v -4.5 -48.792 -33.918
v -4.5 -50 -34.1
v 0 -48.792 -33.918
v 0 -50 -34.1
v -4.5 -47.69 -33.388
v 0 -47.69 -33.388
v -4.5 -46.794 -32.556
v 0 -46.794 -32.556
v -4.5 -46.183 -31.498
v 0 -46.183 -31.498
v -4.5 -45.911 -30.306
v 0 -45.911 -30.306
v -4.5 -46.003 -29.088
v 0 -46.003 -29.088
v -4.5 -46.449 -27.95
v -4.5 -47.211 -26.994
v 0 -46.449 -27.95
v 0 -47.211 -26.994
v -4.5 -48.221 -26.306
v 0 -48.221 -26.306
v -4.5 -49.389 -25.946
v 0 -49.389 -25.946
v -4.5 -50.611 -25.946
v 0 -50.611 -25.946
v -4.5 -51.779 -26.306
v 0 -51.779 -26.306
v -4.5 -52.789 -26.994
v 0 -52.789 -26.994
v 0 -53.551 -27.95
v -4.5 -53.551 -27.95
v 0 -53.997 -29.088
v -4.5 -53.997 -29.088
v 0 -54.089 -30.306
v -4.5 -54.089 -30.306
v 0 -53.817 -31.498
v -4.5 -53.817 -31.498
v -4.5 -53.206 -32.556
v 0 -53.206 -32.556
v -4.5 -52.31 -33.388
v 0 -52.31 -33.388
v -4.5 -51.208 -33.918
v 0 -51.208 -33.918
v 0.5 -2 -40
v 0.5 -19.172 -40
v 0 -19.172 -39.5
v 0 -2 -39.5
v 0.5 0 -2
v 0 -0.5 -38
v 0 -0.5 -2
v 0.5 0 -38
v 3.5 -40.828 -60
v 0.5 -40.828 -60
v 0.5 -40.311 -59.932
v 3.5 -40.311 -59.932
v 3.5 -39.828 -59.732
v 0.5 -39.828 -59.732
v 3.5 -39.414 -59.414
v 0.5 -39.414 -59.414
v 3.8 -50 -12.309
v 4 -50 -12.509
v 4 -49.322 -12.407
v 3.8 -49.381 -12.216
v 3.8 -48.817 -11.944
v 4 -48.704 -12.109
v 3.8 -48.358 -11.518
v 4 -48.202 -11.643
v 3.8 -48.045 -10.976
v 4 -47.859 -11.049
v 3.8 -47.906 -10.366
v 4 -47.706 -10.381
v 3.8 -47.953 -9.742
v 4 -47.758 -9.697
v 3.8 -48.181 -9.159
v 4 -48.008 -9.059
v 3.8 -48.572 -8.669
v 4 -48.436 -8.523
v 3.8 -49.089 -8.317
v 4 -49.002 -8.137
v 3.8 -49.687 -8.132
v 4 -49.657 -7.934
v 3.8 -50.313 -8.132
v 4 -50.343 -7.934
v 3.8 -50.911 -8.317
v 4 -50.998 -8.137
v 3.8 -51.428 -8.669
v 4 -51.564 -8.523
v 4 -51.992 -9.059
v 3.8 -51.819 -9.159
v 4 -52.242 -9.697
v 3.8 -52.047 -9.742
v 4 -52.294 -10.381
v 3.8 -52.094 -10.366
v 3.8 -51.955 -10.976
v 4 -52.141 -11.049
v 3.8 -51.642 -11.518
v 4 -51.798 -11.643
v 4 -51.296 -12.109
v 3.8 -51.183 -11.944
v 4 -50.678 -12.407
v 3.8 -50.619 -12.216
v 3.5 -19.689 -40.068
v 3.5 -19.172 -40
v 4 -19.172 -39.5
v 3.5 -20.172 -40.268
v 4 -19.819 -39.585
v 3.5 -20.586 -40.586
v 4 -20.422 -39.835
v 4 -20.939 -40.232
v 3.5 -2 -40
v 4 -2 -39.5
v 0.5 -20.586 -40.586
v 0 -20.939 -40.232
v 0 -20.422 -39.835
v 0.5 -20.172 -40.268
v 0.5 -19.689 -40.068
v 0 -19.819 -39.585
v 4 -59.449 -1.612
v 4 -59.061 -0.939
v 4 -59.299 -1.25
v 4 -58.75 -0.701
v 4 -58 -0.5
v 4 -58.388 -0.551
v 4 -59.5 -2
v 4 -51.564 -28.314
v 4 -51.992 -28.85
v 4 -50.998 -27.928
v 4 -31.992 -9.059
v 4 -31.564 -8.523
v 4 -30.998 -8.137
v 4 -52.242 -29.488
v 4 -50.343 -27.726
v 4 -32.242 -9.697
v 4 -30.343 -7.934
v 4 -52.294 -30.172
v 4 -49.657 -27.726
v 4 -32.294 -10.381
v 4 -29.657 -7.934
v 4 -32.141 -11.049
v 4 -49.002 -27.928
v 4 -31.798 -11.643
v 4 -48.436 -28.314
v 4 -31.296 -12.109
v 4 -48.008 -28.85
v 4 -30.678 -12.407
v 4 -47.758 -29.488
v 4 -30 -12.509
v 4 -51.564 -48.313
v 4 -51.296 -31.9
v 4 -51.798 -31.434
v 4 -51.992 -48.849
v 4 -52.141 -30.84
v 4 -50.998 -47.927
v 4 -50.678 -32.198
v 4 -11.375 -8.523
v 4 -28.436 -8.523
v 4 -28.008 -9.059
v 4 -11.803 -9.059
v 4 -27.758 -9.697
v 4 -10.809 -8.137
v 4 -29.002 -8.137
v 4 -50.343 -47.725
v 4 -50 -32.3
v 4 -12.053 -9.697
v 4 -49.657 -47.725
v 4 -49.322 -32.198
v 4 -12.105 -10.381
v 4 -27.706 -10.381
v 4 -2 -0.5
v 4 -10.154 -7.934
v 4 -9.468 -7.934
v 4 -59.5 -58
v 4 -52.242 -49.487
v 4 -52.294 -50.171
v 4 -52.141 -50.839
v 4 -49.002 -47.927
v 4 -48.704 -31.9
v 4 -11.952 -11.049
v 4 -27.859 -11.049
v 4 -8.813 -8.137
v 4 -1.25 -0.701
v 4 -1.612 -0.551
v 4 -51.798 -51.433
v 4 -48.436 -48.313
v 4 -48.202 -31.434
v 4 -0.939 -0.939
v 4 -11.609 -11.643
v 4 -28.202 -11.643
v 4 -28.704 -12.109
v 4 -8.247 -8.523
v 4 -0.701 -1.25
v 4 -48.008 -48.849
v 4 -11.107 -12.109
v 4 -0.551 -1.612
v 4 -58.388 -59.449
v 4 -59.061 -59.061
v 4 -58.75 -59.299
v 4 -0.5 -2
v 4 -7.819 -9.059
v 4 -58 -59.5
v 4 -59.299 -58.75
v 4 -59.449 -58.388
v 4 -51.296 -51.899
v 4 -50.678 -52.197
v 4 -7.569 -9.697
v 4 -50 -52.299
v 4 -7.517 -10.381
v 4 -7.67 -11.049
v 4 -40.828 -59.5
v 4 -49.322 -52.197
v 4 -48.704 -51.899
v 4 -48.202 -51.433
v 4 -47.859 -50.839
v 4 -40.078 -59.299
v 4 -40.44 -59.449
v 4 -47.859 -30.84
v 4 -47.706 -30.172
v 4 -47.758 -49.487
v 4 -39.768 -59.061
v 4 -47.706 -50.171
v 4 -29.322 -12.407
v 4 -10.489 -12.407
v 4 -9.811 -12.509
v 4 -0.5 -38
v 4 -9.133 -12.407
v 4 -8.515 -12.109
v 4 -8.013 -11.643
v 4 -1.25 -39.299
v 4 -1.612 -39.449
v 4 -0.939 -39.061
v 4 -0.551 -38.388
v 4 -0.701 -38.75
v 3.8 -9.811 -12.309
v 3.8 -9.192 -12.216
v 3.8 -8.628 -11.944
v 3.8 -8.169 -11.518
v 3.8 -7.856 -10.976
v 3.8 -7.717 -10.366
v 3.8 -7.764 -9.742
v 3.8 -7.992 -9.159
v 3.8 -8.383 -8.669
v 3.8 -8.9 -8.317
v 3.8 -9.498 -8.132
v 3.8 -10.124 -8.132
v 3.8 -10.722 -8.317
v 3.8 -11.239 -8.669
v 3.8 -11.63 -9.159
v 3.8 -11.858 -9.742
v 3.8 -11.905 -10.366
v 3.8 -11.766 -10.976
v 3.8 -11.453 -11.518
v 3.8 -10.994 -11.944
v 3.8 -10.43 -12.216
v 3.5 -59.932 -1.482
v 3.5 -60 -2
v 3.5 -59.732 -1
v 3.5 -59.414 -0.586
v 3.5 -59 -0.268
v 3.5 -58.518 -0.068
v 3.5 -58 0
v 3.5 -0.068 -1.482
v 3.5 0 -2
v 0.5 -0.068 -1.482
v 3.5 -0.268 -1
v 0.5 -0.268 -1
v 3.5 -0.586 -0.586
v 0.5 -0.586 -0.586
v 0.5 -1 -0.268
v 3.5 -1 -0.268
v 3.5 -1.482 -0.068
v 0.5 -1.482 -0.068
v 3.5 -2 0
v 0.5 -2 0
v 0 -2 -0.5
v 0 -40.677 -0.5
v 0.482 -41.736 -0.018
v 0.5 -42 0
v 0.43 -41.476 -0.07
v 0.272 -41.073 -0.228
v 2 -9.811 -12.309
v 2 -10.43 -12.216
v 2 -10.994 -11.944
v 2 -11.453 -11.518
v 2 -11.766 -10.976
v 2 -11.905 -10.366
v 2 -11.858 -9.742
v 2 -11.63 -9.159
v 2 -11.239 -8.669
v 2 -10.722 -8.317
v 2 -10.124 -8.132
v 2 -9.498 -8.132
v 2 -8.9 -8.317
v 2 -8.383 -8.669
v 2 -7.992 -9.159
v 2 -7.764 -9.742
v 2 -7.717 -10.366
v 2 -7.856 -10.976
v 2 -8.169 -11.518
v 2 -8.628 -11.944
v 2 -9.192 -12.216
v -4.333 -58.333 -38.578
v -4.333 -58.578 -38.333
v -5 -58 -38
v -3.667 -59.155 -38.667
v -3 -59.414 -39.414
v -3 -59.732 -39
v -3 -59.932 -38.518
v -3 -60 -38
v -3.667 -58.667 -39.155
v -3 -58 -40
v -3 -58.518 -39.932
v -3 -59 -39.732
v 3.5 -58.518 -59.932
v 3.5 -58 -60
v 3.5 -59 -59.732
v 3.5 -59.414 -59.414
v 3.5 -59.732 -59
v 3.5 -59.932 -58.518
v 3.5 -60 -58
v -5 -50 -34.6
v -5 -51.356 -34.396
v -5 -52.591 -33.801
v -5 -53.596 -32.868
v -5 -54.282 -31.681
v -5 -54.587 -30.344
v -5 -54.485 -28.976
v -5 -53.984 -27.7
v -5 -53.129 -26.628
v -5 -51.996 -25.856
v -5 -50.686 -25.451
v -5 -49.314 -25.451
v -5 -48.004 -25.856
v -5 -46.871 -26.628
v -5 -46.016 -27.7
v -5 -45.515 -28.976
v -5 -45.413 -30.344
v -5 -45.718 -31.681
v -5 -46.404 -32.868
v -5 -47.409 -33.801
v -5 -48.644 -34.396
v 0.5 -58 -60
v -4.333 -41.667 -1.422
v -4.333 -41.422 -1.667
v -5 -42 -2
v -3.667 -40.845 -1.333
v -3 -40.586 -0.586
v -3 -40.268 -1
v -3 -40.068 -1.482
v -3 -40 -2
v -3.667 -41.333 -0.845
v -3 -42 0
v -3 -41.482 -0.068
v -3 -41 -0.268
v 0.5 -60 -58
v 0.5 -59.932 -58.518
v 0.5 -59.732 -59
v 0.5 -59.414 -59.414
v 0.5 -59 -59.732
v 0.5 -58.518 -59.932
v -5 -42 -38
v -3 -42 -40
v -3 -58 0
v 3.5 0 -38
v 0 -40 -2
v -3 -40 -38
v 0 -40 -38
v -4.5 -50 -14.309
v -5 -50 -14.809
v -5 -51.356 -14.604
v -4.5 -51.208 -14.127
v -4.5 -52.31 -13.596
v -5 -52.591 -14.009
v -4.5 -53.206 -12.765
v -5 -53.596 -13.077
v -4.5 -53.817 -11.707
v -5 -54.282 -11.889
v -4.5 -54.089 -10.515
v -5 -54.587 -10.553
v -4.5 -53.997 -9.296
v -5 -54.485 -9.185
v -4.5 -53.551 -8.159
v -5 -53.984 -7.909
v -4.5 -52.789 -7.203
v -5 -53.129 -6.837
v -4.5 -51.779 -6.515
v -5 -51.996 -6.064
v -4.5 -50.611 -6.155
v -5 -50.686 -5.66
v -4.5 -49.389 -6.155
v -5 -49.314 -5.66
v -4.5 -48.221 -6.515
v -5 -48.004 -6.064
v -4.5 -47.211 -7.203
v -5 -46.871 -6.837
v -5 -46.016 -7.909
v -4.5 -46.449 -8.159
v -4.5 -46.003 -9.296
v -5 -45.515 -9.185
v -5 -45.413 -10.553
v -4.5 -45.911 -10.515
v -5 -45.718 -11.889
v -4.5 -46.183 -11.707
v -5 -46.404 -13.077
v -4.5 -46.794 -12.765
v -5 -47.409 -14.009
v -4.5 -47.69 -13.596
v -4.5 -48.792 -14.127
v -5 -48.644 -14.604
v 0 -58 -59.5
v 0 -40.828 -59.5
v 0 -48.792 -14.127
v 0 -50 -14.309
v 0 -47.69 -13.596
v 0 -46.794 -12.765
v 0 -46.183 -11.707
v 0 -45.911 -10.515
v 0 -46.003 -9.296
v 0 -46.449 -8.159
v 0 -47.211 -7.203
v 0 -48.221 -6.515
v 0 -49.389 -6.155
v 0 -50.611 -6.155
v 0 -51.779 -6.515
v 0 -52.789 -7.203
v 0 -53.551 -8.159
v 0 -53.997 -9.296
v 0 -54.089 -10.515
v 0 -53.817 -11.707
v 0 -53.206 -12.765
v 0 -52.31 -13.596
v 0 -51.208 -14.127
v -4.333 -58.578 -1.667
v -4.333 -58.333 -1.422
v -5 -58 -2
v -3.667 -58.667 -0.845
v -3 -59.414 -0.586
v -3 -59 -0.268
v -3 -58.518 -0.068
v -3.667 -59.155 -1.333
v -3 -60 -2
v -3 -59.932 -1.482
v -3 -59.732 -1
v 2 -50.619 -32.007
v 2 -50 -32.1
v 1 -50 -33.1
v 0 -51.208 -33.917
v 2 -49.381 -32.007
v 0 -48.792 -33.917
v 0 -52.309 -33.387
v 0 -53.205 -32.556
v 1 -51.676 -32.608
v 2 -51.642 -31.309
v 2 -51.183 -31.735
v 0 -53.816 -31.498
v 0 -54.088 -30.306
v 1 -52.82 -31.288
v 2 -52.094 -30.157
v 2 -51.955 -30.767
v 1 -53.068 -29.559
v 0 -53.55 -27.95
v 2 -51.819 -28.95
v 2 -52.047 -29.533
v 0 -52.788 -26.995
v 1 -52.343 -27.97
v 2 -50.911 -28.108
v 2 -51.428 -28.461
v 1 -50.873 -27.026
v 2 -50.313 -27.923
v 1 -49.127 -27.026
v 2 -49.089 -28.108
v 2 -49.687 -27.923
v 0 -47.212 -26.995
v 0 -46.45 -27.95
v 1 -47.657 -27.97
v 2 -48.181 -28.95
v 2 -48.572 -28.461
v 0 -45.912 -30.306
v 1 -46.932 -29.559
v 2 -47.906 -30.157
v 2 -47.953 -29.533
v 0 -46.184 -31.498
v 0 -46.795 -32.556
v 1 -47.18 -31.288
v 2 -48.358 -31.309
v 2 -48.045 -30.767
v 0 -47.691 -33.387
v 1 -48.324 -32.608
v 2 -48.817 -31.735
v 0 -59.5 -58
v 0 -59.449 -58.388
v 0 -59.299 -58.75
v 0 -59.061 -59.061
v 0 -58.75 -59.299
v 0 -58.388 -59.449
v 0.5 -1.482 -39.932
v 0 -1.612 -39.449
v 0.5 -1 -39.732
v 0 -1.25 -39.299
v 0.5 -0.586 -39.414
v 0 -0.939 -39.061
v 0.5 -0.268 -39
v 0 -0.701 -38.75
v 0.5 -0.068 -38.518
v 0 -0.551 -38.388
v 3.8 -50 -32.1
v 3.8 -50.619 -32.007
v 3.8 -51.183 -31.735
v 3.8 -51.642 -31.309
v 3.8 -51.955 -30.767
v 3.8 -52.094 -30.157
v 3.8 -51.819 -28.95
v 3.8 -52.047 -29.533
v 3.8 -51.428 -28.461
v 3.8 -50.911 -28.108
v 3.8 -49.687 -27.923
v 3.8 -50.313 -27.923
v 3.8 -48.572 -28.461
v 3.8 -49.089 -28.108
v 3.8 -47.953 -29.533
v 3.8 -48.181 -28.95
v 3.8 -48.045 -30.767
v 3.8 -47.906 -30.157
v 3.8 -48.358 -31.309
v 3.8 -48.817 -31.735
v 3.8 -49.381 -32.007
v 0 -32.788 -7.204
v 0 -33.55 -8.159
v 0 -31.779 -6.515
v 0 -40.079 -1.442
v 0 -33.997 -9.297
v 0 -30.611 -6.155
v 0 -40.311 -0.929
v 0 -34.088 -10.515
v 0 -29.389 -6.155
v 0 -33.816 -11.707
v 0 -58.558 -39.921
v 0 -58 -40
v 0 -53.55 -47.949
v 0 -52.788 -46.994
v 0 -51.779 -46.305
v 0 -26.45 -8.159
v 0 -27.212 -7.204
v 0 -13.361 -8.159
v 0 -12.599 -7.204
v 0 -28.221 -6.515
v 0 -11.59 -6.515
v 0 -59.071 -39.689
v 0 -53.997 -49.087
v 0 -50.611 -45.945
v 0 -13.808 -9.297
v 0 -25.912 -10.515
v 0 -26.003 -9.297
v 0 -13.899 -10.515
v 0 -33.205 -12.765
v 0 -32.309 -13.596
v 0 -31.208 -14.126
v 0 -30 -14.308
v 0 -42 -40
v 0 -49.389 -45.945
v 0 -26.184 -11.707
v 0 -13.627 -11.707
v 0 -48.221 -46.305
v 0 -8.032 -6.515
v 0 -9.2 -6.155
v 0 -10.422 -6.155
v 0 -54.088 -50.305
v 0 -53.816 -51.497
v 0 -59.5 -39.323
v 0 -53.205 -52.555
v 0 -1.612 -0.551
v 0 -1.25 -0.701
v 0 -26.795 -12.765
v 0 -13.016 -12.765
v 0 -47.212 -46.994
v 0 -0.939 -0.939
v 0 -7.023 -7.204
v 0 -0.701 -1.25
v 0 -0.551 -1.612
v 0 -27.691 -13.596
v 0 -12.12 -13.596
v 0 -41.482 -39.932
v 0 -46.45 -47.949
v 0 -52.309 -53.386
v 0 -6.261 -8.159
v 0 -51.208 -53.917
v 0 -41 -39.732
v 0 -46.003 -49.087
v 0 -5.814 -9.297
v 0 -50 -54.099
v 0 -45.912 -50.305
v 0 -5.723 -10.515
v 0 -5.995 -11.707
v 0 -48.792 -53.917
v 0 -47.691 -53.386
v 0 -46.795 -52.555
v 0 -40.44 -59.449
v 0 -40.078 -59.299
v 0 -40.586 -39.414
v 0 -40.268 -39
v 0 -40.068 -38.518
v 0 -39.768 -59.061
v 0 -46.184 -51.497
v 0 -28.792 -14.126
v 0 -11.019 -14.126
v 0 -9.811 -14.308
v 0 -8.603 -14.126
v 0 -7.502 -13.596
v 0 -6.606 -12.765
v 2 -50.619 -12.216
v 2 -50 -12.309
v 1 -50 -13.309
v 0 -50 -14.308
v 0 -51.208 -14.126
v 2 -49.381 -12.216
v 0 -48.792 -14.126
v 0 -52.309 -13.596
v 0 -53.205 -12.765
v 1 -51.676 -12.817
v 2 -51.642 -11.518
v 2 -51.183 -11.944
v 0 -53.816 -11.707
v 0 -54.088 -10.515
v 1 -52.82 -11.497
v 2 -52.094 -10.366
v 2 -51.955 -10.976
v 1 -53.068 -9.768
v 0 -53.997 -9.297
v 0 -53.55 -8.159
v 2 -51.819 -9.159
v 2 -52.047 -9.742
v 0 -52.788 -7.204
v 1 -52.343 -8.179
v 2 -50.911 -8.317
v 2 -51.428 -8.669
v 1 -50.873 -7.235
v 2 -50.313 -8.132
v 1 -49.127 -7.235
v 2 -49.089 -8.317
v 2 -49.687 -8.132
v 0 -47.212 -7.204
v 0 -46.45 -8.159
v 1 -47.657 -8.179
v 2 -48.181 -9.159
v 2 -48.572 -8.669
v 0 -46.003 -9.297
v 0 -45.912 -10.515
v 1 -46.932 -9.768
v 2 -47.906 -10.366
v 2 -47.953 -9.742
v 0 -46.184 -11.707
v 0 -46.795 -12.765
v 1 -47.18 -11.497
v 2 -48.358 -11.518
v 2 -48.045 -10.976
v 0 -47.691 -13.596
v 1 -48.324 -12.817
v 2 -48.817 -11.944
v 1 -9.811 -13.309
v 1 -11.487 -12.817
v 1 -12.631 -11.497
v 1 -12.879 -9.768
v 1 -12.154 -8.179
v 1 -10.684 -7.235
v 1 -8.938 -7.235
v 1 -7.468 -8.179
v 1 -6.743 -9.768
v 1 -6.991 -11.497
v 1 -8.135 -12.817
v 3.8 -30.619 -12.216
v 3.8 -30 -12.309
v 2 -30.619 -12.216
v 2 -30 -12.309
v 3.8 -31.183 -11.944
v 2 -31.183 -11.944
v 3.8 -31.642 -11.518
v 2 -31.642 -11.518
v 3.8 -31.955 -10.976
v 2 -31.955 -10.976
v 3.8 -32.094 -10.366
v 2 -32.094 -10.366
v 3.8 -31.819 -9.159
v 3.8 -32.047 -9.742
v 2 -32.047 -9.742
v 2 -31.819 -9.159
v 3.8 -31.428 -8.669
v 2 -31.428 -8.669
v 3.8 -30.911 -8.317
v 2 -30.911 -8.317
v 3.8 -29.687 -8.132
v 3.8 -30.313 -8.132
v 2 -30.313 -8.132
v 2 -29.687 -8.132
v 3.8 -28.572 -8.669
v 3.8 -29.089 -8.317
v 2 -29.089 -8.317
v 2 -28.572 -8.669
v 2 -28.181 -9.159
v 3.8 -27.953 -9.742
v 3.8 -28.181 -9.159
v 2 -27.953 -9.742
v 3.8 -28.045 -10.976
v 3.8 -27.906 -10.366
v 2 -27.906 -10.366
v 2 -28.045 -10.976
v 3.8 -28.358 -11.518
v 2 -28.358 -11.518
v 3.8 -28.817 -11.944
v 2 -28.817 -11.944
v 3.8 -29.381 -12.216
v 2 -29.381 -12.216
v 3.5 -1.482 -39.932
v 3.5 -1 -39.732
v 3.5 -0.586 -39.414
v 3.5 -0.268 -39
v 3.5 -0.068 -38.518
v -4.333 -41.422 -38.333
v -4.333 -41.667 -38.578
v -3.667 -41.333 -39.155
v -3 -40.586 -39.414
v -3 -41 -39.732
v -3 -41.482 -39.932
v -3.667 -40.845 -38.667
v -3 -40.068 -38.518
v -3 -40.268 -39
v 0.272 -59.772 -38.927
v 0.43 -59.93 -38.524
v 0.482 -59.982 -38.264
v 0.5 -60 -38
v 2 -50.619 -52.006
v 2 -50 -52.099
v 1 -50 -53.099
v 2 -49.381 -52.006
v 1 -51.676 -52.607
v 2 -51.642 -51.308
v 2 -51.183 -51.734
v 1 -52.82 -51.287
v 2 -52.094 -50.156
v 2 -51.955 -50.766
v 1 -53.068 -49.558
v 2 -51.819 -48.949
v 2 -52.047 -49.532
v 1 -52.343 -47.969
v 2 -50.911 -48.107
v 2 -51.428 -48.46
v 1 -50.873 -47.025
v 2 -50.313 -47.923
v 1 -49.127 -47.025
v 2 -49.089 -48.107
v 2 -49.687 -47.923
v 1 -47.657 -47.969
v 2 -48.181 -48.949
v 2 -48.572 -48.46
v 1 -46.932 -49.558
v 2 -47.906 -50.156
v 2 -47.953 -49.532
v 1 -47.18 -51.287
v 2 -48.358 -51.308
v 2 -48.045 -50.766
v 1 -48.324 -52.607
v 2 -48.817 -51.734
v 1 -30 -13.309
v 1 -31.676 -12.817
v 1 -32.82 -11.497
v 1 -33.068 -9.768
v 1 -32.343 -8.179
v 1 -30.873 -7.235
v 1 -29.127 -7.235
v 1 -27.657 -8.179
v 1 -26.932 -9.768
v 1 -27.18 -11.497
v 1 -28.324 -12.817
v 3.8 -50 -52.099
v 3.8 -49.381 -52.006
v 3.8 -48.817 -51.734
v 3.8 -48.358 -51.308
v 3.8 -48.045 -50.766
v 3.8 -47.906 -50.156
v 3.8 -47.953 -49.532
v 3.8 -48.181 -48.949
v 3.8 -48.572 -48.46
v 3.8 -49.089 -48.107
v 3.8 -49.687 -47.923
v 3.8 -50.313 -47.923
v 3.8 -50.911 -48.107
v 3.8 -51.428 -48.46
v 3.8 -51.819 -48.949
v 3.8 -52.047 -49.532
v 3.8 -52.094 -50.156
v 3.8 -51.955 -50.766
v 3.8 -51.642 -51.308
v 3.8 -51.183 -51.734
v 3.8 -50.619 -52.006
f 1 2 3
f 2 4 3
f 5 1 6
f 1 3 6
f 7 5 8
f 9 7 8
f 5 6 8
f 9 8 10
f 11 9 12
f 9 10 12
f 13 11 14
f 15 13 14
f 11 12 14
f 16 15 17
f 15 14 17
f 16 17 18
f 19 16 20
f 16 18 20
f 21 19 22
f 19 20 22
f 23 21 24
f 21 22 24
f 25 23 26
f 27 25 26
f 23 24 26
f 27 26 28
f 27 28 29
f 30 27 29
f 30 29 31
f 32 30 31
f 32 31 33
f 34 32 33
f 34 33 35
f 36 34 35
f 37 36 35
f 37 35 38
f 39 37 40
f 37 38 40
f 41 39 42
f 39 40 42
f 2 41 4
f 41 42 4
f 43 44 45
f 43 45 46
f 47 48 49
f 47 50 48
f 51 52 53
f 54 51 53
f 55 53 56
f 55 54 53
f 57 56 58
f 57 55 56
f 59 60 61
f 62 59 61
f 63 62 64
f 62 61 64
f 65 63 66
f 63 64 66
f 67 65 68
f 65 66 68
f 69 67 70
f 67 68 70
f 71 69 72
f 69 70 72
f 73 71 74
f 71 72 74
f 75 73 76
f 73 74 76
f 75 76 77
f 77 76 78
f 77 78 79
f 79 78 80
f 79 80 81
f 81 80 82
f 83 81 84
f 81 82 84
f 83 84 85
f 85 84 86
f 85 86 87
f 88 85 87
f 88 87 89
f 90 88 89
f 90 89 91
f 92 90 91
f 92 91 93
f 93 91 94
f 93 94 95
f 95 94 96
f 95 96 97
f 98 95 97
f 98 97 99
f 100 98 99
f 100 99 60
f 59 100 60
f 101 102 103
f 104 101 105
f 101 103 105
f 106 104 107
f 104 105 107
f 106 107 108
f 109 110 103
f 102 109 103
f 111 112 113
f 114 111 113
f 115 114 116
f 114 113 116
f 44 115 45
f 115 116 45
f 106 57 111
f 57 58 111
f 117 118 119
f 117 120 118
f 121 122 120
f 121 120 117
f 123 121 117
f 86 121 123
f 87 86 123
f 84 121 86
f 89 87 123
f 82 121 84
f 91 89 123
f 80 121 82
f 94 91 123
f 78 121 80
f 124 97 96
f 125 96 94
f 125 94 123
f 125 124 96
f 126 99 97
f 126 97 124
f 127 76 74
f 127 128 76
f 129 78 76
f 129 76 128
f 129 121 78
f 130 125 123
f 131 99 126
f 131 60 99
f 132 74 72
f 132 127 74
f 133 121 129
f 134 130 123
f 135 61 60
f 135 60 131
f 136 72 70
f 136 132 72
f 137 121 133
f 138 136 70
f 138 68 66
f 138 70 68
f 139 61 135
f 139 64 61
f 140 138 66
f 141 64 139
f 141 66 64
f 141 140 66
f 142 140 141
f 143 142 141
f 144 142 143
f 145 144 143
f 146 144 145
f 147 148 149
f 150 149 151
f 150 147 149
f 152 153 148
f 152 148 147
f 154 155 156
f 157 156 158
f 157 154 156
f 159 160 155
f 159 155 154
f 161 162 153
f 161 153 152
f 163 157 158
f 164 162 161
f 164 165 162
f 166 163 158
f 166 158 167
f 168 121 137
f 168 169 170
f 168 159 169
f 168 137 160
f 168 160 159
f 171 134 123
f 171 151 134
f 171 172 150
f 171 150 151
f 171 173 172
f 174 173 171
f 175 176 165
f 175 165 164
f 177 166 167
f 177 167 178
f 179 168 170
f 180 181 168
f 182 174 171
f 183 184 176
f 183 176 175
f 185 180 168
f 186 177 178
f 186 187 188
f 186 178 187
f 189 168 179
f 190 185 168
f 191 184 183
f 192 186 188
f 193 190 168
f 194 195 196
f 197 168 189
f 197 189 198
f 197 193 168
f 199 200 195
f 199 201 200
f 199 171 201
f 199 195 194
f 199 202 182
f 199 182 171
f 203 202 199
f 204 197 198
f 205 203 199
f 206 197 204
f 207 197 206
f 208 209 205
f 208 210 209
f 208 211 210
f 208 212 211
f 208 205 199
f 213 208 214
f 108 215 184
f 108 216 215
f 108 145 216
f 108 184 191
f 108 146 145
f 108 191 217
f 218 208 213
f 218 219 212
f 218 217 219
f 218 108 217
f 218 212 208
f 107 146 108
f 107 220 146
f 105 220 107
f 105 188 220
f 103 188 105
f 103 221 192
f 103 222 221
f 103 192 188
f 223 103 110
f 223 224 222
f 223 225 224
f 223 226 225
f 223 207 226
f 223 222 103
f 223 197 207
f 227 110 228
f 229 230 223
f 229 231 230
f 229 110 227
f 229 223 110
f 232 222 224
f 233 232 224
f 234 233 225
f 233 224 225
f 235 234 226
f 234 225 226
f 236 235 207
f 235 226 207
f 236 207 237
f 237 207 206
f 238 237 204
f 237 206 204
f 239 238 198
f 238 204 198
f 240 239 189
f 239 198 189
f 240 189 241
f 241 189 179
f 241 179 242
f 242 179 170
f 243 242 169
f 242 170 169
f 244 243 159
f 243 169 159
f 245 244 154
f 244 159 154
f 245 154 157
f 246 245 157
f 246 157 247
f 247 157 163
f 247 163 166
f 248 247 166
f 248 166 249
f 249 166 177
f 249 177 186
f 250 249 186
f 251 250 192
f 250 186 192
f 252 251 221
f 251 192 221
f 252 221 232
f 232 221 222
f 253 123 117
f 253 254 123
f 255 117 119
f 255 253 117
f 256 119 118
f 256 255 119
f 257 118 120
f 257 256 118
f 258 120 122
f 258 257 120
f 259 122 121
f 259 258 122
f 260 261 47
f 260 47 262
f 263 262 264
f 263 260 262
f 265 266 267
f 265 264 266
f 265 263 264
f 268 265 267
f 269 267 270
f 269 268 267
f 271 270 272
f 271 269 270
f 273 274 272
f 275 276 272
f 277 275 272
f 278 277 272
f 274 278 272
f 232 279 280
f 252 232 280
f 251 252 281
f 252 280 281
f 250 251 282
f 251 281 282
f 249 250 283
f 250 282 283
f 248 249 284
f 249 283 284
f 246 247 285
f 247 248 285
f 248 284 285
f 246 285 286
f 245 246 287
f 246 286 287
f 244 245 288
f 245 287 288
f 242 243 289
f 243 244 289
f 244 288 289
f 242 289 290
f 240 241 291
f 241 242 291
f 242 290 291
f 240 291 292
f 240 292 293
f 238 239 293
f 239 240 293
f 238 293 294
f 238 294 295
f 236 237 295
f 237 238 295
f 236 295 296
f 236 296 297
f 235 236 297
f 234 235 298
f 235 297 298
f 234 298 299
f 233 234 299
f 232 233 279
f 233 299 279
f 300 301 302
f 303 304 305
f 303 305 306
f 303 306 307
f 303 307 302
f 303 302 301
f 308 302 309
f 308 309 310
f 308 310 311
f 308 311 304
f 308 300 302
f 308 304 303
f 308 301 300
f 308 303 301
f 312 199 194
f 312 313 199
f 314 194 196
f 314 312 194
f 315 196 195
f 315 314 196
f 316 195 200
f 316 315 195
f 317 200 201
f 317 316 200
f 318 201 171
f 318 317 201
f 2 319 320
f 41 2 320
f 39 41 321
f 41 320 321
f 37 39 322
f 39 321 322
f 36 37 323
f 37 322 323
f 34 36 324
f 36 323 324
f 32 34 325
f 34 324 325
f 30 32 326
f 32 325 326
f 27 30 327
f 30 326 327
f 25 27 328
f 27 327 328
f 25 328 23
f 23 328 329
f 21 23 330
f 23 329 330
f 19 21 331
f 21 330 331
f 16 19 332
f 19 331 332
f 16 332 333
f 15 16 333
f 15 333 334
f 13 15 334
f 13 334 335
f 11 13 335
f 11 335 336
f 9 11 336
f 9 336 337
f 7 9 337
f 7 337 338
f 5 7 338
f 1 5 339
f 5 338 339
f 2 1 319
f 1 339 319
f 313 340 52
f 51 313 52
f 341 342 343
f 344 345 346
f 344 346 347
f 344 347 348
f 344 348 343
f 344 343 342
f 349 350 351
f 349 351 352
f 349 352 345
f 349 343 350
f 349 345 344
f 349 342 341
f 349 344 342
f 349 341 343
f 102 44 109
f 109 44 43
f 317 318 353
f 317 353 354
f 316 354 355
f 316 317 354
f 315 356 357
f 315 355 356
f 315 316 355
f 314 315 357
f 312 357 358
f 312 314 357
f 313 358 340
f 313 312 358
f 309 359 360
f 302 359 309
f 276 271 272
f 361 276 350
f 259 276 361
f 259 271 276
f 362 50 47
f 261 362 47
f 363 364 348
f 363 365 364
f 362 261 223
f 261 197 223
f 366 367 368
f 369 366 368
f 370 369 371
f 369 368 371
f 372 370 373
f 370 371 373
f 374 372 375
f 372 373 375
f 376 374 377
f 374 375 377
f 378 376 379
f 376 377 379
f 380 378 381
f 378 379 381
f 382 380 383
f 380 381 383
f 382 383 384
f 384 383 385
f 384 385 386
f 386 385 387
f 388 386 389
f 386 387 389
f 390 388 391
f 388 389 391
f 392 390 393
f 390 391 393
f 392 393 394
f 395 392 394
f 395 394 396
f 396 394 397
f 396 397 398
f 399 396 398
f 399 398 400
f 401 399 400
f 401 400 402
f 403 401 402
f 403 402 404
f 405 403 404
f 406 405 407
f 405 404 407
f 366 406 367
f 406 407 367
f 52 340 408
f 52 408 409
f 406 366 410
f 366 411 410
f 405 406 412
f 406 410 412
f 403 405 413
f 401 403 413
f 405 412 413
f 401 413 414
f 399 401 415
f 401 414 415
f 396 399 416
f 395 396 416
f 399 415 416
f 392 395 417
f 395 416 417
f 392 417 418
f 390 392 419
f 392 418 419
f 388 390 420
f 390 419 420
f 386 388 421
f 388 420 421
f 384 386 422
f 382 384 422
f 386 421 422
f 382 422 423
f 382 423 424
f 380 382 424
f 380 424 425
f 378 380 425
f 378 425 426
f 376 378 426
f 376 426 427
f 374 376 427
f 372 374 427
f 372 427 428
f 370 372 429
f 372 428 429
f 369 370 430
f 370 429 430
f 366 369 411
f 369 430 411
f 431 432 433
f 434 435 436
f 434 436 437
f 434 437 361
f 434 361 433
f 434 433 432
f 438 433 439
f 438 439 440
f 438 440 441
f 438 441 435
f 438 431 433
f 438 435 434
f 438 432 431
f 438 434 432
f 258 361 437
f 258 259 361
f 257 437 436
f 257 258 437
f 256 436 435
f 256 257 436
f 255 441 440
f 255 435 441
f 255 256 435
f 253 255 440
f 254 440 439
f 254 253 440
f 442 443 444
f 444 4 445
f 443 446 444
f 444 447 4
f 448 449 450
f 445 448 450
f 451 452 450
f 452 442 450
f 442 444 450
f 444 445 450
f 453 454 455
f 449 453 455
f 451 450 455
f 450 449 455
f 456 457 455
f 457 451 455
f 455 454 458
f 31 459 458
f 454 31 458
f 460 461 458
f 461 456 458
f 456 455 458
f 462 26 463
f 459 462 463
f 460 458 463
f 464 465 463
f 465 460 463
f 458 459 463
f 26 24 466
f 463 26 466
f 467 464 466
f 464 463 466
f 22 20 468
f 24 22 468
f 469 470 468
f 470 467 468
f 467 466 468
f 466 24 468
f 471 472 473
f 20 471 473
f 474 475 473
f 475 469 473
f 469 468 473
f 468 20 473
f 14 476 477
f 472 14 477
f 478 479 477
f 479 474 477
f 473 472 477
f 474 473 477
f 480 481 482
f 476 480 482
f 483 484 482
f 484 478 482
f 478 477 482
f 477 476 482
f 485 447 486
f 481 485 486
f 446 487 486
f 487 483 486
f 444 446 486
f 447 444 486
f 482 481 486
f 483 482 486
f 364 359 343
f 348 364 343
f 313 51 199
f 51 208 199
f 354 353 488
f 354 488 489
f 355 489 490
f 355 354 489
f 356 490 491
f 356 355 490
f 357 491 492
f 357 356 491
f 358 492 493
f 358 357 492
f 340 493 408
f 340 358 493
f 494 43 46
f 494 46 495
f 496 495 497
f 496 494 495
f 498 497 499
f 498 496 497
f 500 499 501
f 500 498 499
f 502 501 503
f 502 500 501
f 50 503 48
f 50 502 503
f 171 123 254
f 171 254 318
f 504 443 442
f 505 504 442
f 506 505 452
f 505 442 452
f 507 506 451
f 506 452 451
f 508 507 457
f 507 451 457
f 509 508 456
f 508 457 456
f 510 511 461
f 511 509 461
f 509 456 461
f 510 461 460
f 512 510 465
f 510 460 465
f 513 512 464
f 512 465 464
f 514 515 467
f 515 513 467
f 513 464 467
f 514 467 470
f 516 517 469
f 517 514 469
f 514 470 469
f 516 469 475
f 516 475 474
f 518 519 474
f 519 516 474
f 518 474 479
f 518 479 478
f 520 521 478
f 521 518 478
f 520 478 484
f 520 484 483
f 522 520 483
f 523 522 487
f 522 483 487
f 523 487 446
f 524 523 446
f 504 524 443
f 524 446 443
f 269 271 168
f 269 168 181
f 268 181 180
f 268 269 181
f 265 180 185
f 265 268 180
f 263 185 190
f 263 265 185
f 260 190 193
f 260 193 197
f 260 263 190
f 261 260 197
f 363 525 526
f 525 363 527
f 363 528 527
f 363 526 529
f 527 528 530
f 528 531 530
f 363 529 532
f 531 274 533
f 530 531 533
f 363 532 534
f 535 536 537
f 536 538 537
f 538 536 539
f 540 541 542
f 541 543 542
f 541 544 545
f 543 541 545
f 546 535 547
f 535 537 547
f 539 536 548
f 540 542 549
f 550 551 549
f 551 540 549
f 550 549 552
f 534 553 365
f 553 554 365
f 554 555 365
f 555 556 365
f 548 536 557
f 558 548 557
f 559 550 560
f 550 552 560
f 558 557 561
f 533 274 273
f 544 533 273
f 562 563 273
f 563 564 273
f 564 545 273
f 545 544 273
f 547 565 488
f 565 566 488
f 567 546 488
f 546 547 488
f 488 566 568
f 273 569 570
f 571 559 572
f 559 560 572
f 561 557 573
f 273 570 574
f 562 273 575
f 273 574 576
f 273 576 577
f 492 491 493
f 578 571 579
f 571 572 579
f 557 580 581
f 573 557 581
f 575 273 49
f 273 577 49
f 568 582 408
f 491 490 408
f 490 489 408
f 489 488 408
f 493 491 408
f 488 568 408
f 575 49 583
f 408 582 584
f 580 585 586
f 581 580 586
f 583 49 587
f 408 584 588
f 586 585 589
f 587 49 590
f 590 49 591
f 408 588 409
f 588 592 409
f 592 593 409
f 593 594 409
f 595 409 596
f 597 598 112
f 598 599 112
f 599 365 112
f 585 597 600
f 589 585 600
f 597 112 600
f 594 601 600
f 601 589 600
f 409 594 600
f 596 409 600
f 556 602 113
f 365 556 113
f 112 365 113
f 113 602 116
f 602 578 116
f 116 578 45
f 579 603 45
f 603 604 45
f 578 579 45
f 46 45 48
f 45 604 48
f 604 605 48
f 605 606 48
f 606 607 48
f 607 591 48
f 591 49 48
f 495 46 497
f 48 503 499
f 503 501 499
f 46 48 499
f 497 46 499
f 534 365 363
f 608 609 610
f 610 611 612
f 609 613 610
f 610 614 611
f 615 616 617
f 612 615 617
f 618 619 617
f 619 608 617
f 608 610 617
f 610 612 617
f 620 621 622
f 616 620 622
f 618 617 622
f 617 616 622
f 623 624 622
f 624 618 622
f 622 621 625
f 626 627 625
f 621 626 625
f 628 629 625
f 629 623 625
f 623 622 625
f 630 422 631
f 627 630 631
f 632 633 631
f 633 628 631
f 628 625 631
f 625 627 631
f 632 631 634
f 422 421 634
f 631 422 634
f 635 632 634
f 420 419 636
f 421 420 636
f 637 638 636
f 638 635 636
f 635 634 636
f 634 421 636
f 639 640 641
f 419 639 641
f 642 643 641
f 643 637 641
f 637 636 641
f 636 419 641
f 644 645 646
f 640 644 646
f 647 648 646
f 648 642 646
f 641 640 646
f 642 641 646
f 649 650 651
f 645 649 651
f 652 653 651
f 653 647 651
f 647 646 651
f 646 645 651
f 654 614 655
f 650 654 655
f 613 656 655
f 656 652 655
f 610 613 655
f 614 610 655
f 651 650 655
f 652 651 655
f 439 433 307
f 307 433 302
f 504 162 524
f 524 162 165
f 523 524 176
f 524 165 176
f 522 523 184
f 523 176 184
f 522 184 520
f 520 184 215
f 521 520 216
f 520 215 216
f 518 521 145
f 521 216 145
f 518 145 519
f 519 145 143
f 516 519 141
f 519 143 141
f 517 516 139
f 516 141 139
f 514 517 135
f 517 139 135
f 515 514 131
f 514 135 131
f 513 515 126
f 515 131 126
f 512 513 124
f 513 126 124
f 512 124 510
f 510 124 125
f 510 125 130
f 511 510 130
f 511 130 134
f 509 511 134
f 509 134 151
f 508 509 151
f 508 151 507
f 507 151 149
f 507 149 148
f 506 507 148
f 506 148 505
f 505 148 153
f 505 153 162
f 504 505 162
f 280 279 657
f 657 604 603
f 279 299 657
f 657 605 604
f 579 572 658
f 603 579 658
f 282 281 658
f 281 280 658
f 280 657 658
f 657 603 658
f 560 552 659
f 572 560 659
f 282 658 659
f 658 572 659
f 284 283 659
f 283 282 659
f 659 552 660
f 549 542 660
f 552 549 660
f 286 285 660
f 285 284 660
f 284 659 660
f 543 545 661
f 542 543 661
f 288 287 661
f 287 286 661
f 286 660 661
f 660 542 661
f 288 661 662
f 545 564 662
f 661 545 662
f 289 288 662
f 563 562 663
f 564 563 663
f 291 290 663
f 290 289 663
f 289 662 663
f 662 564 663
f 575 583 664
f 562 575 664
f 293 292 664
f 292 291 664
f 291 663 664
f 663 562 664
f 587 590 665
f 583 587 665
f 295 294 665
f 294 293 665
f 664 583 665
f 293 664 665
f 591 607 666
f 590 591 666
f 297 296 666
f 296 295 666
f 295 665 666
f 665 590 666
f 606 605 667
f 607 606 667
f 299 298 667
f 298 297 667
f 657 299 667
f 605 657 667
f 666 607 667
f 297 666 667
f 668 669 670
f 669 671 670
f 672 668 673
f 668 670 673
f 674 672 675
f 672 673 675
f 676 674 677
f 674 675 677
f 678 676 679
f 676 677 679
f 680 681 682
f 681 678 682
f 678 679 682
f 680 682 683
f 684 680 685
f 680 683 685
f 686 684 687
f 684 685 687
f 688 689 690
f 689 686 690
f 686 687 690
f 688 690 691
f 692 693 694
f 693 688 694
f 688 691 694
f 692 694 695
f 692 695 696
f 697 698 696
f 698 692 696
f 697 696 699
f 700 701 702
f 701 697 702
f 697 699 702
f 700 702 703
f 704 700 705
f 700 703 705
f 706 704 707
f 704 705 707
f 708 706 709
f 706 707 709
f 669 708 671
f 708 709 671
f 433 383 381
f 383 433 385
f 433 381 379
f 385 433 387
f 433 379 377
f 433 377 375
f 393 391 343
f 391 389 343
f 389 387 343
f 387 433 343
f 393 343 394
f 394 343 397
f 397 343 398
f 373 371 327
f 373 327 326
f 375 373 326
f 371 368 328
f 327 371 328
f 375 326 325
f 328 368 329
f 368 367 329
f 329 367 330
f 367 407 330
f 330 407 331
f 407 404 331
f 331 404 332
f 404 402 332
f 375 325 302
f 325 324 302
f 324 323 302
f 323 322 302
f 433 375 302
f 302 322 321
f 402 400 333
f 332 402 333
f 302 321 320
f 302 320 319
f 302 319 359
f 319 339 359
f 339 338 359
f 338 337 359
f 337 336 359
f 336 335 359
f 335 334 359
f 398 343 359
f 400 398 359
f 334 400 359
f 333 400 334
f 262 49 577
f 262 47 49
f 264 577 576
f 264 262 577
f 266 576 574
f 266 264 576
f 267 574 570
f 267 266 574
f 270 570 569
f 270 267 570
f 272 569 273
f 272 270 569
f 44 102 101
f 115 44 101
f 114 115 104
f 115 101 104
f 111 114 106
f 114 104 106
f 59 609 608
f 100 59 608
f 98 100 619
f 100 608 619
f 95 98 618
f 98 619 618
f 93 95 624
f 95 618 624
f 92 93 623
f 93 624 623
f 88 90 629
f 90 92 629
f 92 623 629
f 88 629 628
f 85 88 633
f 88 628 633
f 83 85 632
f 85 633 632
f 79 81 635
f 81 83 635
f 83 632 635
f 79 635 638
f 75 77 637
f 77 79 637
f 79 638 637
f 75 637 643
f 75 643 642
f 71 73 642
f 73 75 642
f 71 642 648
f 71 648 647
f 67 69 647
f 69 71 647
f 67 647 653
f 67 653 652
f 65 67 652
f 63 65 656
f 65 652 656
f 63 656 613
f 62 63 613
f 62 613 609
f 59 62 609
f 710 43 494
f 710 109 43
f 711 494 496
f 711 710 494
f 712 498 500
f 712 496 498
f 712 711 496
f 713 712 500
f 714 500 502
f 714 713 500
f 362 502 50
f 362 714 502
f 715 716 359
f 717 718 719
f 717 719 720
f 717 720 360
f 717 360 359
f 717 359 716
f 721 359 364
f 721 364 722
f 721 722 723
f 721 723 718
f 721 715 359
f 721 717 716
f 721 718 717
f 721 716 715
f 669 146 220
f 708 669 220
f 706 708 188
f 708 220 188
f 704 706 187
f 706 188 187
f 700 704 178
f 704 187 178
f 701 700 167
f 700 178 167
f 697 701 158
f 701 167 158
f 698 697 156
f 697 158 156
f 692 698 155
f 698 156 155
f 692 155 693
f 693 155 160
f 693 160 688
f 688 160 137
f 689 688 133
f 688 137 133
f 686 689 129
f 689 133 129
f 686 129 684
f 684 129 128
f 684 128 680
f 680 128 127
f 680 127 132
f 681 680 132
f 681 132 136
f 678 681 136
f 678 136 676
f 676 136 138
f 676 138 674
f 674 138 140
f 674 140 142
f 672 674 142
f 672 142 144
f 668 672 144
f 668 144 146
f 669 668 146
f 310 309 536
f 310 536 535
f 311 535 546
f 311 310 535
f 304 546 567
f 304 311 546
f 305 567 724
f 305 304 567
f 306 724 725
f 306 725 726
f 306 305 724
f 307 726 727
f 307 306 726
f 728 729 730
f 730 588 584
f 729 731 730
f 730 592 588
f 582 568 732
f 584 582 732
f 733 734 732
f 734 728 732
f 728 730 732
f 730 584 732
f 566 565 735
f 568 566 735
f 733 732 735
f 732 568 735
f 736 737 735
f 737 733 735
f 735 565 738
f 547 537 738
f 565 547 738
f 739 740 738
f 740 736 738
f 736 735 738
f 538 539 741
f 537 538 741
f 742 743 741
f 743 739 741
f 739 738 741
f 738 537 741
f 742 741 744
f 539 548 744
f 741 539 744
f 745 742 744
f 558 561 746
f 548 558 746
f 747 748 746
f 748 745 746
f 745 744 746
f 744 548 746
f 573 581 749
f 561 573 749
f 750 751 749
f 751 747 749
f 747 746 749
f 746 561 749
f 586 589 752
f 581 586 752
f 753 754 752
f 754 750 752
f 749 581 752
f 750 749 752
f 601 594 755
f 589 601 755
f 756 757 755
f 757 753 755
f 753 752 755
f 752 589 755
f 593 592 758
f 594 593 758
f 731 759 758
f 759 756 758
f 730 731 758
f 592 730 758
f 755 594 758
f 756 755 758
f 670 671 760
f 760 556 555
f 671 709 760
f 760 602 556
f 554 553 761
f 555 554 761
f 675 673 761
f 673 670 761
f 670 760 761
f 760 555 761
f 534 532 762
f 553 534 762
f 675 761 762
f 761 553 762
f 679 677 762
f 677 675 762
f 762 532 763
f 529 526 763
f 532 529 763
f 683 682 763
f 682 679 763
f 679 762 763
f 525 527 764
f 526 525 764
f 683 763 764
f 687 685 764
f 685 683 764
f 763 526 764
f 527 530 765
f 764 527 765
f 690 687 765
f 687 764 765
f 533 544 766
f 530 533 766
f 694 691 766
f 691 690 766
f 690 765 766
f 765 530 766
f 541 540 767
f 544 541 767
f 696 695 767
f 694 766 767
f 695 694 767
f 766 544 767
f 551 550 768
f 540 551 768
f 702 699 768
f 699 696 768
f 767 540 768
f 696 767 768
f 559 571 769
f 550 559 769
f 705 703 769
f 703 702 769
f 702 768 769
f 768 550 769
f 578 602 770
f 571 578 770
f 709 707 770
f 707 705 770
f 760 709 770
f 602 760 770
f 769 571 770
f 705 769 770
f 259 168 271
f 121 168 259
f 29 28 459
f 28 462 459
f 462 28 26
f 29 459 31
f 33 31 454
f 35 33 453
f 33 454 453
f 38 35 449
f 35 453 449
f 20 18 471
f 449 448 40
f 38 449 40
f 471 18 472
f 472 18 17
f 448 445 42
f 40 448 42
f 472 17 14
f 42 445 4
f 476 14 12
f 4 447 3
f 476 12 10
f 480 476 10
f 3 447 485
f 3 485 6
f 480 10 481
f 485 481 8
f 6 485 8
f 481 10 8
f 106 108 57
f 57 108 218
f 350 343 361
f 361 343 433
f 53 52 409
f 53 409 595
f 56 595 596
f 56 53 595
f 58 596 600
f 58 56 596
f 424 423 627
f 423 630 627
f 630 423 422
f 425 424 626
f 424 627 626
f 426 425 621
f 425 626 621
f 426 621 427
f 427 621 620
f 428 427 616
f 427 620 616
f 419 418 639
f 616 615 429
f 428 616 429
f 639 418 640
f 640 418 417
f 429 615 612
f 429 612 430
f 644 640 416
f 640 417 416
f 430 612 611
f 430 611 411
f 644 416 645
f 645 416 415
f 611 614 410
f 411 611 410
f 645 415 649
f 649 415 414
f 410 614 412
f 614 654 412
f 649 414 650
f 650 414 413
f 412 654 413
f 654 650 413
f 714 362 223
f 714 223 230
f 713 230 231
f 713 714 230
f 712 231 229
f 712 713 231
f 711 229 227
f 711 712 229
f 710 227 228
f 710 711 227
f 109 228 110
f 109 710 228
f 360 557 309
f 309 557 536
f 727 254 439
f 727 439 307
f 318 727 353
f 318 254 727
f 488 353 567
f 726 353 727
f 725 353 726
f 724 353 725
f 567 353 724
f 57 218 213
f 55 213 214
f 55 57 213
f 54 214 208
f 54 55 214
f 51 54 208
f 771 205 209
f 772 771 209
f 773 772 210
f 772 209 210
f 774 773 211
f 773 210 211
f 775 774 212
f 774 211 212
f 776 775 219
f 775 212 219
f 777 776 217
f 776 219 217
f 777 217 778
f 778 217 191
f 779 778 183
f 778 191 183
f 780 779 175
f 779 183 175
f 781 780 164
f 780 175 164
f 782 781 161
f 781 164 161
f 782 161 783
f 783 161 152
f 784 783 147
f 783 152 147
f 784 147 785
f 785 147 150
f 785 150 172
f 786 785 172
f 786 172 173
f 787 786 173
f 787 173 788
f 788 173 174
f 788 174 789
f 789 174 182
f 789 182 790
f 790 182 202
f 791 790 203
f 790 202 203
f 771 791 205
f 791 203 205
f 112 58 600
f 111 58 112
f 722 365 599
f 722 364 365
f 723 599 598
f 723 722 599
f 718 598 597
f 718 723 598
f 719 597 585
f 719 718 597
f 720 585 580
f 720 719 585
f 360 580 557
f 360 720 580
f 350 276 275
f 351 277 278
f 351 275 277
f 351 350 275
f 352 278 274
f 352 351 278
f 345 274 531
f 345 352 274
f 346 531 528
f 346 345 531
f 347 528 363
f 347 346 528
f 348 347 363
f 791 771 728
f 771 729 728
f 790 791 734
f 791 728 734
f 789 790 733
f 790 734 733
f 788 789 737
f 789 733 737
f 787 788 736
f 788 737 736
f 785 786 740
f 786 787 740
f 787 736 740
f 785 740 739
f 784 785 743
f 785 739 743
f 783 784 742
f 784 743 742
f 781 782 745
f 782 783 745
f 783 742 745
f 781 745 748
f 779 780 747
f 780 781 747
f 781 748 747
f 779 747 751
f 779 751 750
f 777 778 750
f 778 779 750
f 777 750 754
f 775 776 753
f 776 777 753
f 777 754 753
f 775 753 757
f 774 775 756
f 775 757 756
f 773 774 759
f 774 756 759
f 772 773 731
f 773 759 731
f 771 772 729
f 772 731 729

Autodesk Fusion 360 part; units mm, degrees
sketch "Sketch1" plane through (0, 0, 0) normal (1, 0, 0) x (0, 0, -1)
  line L0 (0, 0) -> (0, -60)
  line L1 (0, -60) -> (60, -60)
  line L2 (60, -60) -> (60, -40)
  line L3 (40, 0) -> (0, 0)
  line L4 (40, -40) -> (40, -60)
  line L5 (40, -40) -> (0, -40)
  line L6 (60, -40) -> (40, -20)
  line L7 (40, -20) -> (40, 0)
  line L8 (60, -50) -> (0, -50) construction
  line L9 (10.2088, 0) -> (10.2088, -60) construction
  line L10 (0, -9.7462) -> (40, -10) construction
  line L11 (0, -30) -> (50, -30) construction
  line L12 (49.9986, -60) -> (50, -30) construction
  line L13 (30, -60) -> (30, 0) construction
  circle A0 centre (10.2088, -9.811) radius 2.1
  circle A1 centre (10.2088, -30) radius 2.1
  circle A2 centre (10.2088, -50) radius 2.1
  circle A3 centre (30, -50) radius 2.1
  circle A4 centre (49.9991, -50) radius 2.1
  circle A5 centre (30, -50) radius 4.1
  circle A6 centre (10.2088, -50) radius 4.1
  dimension "d1" = 60
  dimension "d2" = 60
  dimension "d3" = 20
  dimension "d4" = 20
  dimension "d15" = 4.2
  dimension "d16" = 4.2
  dimension "d17" = 4.2
  dimension "d18" = 4.2
  dimension "d19" = 4.2
  dimension "d20" = 8.2
  dimension "d21" = 8.2
extrude "Extrude1" add sketch "Sketch1" along normal blind 4 contours L0 L1 L2 L3 L4 L5 L6 L7 | L0 L1 L4 L5 | A5 | A6
extrude "Extrude2" add sketch "Sketch1" against normal blind 5 contours L0 L1 L4 L5
chamfer "Chamfer1" distance 2 angle 45 5 edges at (0, -9.0516, -8.2509) (0, -29.2406, -8.2509) (0, -49.2406, -8.2509) (0, -49.2406, -28.0421) (0, -49.2406, -48.0412)
fillet "Fillet1" radius 2 9 edges at (2, -60, -60) (-0.5, -60, 0) (2, -40, -60) (2, -20, -40) (2, 0, -40) (2, 0, 0) (-2.5, -40, -40) (-2.5, -60, -40) (-2.5, -40, 0)
chamfer "Chamfer2" distance 0.5 angle 45 25 edges at (-5, -51.4826, -26.1775) (-5, -51.4826, -6.3862) (0, -60, -48) (0, -59.4142, -59.4142) (0, -49.4142, -60) (0, -40.0631, -59.8478) (0, -30, -50) (0, -19.9369, -40.1522) (0, -10.5858, -40) (0, -0.5858, -39.4142) (0, 0, -20) (0, -0.5858, -0.5858) (0, -22, 0) (4, -59.4142, -59.4142) (4, -49.4142, -60) (4, -40.0631, -59.8478) (4, -30, -50) (4, -19.9369, -40.1522) (4, -10.5858, -40) (4, -0.5858, -39.4142) (4, 0, -20) (4, -0.5858, -0.5858) (4, -30, 0) (4, -59.4142, -0.5858) (4, -60, -30)
chamfer "Chamfer3" distance 0.2 angle 45 5 edges at (4, -9.0516, -8.2509) (4, -29.2406, -8.2509) (4, -49.2406, -8.2509) (4, -49.2406, -28.0421) (4, -49.2406, -48.0412)
chamfer "Chamfer4" distance 2 angle 45 8 edges at (-5, -59.4142, -0.5858) (-5, -50, 0) (-5, -40.5858, -0.5858) (-5, -40, -20) (-5, -40.5858, -39.4142) (-5, -50, -40) (-5, -59.4142, -39.4142) (-5, -60, -20)
